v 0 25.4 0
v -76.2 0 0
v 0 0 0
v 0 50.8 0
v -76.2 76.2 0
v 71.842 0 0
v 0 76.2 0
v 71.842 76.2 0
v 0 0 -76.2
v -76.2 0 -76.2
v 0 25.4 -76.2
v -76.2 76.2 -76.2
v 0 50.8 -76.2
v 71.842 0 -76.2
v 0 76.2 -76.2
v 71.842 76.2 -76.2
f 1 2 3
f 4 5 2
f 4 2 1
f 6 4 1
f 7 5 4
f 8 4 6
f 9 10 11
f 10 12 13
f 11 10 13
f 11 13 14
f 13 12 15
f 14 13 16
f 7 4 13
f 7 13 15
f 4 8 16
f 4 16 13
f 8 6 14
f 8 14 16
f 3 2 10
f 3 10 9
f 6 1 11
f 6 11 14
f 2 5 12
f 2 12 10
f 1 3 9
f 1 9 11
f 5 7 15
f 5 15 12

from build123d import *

# Parameters (mm, degrees)
F1_DEPTH = 76.2


with BuildPart() as f1:
    # F0 (on Top) → F1 (new body)
    with BuildSketch(Plane.XY):
        Polygon((0, 50.8), (0, 25.4), (71.842049, 0), (71.842049, 76.2), align=None)
        Polygon((-76.2, 76.2), (-76.2, 0), (0, 0), (0, 25.4), (0, 50.8), (0, 76.2), align=None)
    extrude(amount=-F1_DEPTH)


solid = f1.part
